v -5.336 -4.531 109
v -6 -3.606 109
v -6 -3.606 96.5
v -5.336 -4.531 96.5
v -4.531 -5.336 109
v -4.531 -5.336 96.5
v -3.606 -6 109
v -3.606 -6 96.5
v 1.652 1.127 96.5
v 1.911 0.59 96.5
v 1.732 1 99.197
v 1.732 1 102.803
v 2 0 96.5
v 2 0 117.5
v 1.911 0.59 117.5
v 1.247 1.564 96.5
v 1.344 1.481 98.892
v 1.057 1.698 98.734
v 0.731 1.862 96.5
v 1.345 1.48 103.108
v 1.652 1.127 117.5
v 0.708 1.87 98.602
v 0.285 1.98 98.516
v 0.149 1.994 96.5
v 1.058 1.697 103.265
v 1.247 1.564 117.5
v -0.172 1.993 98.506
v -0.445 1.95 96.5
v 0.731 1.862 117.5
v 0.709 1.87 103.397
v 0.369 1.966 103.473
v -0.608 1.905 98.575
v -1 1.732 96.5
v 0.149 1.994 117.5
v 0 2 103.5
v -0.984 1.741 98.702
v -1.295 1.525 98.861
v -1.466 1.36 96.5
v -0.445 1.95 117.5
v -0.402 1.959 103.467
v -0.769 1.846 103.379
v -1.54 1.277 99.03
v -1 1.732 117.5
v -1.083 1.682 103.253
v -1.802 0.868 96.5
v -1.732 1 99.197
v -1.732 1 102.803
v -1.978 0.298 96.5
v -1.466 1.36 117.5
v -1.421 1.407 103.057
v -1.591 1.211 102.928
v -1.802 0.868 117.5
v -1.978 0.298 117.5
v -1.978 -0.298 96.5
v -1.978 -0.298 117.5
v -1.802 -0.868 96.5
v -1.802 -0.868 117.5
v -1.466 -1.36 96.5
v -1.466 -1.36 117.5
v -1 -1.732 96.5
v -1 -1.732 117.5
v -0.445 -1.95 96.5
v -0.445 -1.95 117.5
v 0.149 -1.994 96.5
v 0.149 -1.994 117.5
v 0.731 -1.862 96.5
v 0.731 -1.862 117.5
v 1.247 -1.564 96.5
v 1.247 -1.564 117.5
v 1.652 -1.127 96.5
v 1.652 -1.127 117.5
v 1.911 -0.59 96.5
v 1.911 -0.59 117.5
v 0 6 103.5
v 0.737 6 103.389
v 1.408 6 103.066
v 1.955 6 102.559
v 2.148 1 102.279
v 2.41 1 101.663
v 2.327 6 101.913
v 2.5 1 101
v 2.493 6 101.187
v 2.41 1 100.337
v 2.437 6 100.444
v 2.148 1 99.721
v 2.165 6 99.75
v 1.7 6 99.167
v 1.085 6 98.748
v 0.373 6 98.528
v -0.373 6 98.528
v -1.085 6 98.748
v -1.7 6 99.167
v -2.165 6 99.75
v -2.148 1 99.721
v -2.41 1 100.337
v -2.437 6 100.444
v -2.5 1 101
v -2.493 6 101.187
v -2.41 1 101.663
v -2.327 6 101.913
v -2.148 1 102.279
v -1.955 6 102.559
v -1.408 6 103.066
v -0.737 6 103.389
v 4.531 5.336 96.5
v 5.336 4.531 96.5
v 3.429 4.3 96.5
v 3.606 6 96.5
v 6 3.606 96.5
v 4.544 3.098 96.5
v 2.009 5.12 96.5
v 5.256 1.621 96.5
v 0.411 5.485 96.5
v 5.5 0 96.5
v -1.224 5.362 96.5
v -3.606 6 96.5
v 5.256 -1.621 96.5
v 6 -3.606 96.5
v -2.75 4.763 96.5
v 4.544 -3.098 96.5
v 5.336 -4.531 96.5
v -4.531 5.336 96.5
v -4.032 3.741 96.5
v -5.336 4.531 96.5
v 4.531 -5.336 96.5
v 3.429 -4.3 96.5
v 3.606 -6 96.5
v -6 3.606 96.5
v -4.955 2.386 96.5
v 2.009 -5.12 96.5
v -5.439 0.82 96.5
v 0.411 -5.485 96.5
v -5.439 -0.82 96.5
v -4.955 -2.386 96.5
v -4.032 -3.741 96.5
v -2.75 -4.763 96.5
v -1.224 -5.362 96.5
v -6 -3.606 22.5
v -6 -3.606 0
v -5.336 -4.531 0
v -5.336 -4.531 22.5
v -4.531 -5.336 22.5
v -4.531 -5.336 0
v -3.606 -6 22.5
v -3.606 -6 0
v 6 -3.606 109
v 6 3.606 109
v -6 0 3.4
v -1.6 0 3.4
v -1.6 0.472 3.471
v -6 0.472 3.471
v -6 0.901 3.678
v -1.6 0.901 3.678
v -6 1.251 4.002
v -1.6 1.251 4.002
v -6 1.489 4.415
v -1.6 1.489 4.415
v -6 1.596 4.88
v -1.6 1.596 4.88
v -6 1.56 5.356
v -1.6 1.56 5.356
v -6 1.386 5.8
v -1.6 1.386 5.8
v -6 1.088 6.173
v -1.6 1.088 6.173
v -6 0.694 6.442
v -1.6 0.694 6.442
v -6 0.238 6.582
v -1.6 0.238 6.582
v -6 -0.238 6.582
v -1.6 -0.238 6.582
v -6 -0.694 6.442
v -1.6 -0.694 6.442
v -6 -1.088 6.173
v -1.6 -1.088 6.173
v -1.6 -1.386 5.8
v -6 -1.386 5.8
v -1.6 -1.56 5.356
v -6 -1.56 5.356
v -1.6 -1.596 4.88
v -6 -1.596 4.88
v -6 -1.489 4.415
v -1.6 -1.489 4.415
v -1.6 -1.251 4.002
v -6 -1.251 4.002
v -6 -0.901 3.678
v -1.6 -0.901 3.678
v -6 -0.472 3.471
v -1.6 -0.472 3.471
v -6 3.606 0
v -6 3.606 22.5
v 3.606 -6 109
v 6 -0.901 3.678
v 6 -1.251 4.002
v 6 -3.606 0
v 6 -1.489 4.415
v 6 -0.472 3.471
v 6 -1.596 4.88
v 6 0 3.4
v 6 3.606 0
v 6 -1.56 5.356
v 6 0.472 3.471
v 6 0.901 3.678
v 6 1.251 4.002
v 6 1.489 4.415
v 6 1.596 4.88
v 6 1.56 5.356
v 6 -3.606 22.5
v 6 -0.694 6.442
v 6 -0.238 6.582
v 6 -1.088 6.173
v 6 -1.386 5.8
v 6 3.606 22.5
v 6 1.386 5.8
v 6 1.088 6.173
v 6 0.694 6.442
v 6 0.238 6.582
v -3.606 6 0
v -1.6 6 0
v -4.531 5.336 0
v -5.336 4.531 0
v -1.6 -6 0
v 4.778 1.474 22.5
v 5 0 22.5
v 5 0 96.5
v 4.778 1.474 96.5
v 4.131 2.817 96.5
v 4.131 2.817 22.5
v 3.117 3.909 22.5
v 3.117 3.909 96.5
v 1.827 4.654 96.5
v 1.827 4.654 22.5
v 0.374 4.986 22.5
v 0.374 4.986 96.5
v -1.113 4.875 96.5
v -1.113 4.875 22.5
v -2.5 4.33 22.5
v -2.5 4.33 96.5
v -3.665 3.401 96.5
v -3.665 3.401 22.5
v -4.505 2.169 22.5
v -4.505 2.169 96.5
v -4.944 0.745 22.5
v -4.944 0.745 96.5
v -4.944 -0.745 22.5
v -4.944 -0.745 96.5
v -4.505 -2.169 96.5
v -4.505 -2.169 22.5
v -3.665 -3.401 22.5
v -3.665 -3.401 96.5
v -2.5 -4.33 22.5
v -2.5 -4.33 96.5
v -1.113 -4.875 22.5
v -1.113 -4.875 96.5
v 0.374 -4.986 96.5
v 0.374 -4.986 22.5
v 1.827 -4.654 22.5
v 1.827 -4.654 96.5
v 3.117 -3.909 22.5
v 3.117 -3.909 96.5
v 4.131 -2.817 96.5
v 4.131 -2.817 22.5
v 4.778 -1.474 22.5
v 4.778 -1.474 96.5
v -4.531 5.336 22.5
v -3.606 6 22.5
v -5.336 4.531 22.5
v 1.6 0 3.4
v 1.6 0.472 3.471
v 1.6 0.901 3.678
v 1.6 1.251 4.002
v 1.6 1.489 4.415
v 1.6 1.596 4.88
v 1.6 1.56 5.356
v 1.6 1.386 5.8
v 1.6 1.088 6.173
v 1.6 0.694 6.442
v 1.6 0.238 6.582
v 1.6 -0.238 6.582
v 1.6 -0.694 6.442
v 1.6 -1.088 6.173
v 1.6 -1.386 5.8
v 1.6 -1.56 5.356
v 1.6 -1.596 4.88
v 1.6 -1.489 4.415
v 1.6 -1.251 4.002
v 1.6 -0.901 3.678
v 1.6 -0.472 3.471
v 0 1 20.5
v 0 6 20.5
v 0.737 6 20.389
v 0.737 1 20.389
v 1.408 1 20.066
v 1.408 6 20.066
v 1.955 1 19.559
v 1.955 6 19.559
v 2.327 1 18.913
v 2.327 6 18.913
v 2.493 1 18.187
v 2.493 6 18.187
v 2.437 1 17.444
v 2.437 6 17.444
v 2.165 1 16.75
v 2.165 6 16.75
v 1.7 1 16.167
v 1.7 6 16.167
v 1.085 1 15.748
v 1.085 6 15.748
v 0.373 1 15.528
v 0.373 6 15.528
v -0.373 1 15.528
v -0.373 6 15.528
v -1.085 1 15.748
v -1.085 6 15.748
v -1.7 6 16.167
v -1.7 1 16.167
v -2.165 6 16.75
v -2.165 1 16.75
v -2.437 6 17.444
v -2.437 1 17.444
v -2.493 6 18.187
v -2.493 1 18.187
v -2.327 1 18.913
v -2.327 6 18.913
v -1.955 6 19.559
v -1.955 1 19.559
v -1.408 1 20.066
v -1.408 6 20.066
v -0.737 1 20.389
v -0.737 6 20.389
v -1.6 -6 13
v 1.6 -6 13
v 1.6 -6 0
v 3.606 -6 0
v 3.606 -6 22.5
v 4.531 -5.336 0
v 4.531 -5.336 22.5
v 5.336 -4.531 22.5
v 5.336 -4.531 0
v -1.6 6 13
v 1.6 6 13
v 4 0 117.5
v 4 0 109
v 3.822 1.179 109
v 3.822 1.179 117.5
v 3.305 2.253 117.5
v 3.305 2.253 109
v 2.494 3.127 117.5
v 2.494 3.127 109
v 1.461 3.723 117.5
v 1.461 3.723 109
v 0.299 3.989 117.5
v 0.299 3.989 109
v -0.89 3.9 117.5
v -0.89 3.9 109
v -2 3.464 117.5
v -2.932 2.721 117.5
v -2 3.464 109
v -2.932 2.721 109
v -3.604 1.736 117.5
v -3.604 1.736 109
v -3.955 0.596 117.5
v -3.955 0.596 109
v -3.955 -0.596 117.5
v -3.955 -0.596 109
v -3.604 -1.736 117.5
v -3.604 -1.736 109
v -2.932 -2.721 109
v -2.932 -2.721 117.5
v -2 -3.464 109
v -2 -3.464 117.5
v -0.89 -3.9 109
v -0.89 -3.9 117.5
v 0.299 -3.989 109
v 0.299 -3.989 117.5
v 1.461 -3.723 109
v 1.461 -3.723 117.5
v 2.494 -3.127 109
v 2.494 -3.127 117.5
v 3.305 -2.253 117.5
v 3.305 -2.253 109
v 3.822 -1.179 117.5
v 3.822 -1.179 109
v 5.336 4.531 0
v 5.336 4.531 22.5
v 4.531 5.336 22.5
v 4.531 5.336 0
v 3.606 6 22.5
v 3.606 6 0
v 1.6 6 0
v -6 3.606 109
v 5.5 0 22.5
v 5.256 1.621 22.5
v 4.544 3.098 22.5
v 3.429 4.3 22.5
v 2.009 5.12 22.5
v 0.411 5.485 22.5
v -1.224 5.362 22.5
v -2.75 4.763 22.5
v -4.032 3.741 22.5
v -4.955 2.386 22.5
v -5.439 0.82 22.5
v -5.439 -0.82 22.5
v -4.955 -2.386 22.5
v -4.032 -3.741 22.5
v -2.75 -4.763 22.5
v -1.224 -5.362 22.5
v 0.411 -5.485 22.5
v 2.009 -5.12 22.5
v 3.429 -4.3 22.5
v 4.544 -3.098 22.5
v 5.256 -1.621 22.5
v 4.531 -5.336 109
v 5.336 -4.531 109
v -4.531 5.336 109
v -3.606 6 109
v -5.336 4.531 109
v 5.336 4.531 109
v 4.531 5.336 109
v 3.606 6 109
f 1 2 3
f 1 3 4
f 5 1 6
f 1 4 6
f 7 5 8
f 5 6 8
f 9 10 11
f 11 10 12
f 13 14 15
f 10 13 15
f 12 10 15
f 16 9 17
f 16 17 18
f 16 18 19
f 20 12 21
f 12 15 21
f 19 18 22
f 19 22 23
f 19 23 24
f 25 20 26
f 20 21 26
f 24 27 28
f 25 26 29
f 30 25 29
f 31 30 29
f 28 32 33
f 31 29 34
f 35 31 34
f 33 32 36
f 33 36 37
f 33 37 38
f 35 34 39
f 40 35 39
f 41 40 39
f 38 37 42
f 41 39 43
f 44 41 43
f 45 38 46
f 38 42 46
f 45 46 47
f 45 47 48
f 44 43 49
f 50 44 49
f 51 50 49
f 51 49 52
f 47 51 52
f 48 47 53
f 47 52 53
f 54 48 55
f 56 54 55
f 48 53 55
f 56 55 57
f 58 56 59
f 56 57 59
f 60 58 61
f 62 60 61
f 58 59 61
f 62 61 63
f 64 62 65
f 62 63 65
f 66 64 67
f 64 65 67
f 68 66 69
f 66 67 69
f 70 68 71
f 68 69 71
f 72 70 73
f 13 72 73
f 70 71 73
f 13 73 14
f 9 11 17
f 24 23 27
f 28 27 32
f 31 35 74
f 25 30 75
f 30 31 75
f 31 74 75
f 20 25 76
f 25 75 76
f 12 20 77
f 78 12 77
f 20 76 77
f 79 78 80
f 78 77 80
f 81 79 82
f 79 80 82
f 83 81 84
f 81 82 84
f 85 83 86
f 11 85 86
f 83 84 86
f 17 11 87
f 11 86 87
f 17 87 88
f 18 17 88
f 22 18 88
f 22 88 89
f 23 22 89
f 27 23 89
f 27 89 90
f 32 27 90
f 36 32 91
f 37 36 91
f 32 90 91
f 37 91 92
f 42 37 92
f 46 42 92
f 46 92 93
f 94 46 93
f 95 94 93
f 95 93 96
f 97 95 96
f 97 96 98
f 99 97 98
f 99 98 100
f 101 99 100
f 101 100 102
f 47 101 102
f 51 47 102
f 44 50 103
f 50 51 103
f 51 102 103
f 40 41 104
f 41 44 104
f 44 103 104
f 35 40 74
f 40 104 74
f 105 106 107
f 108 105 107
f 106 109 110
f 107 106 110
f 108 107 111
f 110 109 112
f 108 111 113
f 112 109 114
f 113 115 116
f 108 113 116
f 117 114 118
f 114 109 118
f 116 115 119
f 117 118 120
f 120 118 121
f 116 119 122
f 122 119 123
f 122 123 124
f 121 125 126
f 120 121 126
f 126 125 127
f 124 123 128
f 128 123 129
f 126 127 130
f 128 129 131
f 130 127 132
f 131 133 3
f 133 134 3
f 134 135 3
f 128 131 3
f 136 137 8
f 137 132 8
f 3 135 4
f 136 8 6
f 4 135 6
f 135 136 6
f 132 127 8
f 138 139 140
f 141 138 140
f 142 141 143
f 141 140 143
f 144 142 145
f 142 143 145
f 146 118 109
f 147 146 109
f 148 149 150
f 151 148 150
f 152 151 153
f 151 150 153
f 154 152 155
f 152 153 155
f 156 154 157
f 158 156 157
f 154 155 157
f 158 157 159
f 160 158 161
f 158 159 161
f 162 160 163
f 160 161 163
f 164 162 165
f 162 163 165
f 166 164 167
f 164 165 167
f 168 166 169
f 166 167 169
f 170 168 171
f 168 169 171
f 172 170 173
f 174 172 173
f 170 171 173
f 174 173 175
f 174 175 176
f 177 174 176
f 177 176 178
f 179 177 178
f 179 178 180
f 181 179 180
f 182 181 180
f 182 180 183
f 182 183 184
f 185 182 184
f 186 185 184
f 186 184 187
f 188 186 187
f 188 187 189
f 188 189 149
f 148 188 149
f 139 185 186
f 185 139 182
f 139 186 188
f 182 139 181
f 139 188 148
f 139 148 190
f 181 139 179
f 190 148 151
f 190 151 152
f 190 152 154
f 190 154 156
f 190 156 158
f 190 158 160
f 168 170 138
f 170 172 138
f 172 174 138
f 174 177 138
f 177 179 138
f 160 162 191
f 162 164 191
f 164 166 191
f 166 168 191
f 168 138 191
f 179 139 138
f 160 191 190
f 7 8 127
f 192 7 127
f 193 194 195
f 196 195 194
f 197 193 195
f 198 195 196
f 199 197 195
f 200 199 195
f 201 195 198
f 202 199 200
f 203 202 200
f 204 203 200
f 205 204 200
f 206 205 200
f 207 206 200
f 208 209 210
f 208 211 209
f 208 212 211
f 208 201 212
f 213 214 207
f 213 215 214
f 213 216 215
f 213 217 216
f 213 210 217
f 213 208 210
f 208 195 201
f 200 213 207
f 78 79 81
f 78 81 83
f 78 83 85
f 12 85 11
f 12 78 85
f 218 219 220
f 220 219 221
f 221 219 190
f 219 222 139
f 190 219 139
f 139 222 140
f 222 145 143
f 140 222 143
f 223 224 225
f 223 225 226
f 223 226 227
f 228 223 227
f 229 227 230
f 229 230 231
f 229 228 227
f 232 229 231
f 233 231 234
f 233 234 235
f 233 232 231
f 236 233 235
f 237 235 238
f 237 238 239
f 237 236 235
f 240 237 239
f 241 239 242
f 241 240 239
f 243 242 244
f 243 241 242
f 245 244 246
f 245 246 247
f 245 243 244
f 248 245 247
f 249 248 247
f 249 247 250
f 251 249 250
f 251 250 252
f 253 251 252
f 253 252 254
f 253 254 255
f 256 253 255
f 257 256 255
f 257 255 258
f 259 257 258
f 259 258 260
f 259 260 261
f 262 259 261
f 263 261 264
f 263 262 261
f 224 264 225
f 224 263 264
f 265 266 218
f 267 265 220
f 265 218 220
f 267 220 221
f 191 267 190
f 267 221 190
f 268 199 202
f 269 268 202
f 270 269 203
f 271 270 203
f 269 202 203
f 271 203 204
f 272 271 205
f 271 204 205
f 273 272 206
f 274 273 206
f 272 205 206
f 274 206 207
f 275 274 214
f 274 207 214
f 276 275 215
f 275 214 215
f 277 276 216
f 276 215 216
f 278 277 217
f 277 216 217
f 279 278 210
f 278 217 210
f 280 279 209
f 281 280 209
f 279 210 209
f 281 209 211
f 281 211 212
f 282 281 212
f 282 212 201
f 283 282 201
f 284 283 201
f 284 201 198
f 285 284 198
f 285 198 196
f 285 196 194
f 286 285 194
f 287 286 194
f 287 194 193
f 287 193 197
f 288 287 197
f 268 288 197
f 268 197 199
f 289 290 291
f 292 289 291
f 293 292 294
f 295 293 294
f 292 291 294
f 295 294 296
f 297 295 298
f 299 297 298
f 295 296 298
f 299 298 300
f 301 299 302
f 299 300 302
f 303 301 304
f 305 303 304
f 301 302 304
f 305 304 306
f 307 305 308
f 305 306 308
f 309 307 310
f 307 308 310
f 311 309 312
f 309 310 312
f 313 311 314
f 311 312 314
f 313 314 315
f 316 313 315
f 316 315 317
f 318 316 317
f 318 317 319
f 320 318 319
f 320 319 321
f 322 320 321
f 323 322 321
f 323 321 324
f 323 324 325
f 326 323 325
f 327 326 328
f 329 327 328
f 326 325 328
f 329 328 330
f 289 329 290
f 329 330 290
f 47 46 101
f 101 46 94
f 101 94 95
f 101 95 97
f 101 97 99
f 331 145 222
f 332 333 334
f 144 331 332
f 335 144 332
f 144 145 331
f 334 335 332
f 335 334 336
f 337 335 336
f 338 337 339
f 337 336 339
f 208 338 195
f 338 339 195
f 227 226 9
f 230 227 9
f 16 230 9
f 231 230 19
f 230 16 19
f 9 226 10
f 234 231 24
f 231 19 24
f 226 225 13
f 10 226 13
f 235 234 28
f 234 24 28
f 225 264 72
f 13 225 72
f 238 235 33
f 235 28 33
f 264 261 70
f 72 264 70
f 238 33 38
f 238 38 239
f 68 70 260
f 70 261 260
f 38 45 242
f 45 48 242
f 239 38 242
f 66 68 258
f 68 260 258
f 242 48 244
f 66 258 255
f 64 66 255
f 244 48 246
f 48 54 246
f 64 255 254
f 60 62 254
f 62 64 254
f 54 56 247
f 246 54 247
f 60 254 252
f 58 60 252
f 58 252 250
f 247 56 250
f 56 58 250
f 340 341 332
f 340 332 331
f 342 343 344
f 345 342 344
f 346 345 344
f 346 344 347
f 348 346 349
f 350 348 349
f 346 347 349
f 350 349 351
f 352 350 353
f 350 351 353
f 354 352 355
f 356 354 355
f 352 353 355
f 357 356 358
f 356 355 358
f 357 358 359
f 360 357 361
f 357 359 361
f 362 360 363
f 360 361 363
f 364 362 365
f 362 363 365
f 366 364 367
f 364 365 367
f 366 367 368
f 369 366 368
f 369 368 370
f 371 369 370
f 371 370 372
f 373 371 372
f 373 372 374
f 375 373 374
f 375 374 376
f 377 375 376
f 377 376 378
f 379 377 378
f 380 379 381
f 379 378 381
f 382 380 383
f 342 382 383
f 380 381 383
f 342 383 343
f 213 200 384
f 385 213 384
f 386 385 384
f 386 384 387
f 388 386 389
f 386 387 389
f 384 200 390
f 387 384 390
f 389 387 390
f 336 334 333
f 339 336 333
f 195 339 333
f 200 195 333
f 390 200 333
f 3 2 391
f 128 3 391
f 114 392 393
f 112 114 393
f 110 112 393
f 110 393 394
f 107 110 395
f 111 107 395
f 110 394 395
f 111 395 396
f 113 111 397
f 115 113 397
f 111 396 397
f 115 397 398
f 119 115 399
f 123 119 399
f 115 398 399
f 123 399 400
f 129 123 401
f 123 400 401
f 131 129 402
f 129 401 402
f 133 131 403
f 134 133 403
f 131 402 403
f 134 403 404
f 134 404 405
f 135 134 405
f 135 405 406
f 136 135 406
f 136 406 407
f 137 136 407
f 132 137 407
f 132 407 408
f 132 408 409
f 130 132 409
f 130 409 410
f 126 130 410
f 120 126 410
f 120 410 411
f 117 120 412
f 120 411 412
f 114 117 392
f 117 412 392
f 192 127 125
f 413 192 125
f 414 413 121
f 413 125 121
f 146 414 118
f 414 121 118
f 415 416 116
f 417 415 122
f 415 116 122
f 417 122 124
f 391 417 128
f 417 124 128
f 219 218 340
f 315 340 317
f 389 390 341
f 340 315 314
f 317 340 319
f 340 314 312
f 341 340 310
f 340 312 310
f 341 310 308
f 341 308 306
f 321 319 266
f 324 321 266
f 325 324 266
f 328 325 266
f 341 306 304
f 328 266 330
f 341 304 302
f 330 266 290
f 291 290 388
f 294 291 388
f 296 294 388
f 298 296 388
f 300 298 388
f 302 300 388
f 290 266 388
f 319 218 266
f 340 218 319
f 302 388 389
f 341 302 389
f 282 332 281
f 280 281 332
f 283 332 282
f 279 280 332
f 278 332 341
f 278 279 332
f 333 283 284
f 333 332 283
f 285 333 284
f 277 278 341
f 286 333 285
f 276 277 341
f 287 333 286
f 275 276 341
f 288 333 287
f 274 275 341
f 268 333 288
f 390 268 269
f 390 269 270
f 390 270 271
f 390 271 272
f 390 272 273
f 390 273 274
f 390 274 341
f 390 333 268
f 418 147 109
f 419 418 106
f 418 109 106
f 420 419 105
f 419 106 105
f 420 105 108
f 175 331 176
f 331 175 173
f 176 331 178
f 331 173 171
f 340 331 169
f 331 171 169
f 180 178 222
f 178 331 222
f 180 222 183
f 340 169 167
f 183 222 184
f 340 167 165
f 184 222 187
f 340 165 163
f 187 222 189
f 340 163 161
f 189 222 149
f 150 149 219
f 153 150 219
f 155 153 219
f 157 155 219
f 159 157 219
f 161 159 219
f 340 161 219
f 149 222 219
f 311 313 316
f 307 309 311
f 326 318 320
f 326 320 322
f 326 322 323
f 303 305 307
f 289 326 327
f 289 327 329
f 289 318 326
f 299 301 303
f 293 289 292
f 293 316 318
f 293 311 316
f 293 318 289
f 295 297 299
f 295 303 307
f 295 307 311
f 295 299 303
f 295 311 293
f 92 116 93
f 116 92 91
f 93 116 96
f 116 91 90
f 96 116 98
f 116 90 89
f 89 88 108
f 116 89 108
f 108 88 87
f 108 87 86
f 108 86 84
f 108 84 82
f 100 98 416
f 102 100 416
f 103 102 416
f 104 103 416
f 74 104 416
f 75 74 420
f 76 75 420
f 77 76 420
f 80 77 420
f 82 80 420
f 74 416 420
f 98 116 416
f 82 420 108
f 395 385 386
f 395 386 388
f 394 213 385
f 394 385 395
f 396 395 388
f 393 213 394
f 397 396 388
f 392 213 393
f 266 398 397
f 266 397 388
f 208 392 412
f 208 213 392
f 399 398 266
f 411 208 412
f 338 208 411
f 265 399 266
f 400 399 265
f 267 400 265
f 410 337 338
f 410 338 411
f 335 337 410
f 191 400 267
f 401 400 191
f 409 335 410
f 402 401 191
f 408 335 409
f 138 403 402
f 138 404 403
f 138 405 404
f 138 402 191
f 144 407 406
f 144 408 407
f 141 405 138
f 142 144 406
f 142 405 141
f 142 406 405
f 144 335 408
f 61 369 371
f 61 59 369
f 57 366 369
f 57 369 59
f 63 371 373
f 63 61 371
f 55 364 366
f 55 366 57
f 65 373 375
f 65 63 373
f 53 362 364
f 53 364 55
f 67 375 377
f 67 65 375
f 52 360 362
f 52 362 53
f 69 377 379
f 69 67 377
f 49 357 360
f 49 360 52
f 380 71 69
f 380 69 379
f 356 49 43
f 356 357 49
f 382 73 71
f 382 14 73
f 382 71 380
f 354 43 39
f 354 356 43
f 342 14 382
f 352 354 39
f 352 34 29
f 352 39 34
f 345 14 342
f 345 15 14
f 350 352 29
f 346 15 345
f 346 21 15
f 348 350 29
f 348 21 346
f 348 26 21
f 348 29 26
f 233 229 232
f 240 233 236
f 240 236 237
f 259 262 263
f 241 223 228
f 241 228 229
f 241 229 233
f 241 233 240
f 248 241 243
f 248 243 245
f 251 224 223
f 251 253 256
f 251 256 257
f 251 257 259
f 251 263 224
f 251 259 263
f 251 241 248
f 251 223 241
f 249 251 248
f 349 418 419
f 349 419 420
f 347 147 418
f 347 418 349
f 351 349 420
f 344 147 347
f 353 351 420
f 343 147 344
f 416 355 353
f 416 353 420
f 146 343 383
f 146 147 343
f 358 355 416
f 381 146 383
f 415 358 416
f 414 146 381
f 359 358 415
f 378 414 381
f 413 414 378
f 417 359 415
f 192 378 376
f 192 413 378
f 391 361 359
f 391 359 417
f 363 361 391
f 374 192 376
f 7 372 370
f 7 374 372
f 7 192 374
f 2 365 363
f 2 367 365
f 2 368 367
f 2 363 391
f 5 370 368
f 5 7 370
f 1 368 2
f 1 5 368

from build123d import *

# Parameters (mm, degrees)
SKETCH_1_R          = 7
EXTRUDE_1_DEPTH     = 22.5
SKETCH_2_R          = 5.5
SKETCH_2_R_2        = 5
EXTRUDE_2_DEPTH     = 74
SKETCH_3_R          = 7
EXTRUDE_3_DEPTH     = 12.5
SKETCH_4_R          = 4
EXTRUDE_4_DEPTH     = 8.5
SKETCH_5_R          = 2
CUT_EXTRUDE_1_DEPTH = 50
SKETCH_6_R          = 10
SKETCH_6_W          = 12
SKETCH_6_H          = 12
CUT_EXTRUDE_2_DEPTH = 110.448618082
SKETCH_7_W          = 3.2
SKETCH_7_H          = 12
CUT_EXTRUDE_3_DEPTH = 13
SKETCH_8_R          = 1.6
CUT_EXTRUDE_4_DEPTH = 119.263477033
SKETCH_9_R          = 2.5
CUT_EXTRUDE_5_DEPTH = 5
SKETCH_10_R         = 2.5
CUT_EXTRUDE_6_DEPTH = 5


with BuildPart() as part:
    # 草图1 → 凸台-拉伸1 (new body)
    with BuildSketch(Plane.XY):
        with Locations(Location((0, 0, 0), (0, 0, 180))):
            Circle(SKETCH_1_R)
    extrude(amount=EXTRUDE_1_DEPTH)

    # 草图2 → 凸台-拉伸2 (add)
    with BuildSketch(Plane.XY.offset(22.5)):
        Circle(SKETCH_2_R)
        Circle(SKETCH_2_R_2, mode=Mode.SUBTRACT)
    extrude(amount=EXTRUDE_2_DEPTH)

    # 草图3 → 凸台-拉伸3 (add)
    with BuildSketch(Plane.XY.offset(96.5)):
        with Locations(Location((0, 0, 0), (0, 0, 180))):
            Circle(SKETCH_3_R)
    extrude(amount=EXTRUDE_3_DEPTH)

    # 草图4 → 凸台-拉伸4 (add)
    with BuildSketch(Plane.XY.offset(109)):
        Circle(SKETCH_4_R)
    extrude(amount=EXTRUDE_4_DEPTH)

    # 草图5 → 切除-拉伸1 (cut)
    with BuildSketch(Plane.XY.offset(117.5)):
        Circle(SKETCH_5_R)
    extrude(amount=-CUT_EXTRUDE_1_DEPTH, mode=Mode.SUBTRACT)

    # 草图6 → 切除-拉伸2 (cut, through all)
    with BuildSketch(Plane.XY.offset(109)):
        Circle(SKETCH_6_R)
        Rectangle(SKETCH_6_W, SKETCH_6_H, mode=Mode.SUBTRACT)
    extrude(amount=-CUT_EXTRUDE_2_DEPTH, mode=Mode.SUBTRACT)

    # 草图7 → 切除-拉伸3 (cut)
    with BuildSketch(Plane(origin=(0, 0, 0), x_dir=(-1, 0, 0), z_dir=(0, 0, -1))):
        Rectangle(SKETCH_7_W, SKETCH_7_H)
    extrude(amount=-CUT_EXTRUDE_3_DEPTH, mode=Mode.SUBTRACT)

    # 草图8 → 切除-拉伸4 (cut, through all)
    with BuildSketch(Plane(origin=(6, 0, 0), x_dir=(0, 0, -1), z_dir=(1, 0, 0))):
        with Locations((-5, 0)):
            Circle(SKETCH_8_R)
    extrude(amount=-CUT_EXTRUDE_4_DEPTH, mode=Mode.SUBTRACT)

    # 草图9 → 切除-拉伸5 (cut)
    with BuildSketch(Plane(origin=(0, 6, 0), x_dir=(1, 0, 0), z_dir=(0, 1, 0))):
        with Locations(Location((0, -18, 0), (0, 0, 270))):
            Circle(SKETCH_9_R)
    extrude(amount=-CUT_EXTRUDE_5_DEPTH, mode=Mode.SUBTRACT)

    # 草图10 → 切除-拉伸6 (cut)
    with BuildSketch(Plane(origin=(0, 6, 0), x_dir=(1, 0, 0), z_dir=(0, 1, 0))):
        with Locations(Location((0, -101, 0), (0, 0, 270))):
            Circle(SKETCH_10_R)
    extrude(amount=-CUT_EXTRUDE_6_DEPTH, mode=Mode.SUBTRACT)


solid = part.part
